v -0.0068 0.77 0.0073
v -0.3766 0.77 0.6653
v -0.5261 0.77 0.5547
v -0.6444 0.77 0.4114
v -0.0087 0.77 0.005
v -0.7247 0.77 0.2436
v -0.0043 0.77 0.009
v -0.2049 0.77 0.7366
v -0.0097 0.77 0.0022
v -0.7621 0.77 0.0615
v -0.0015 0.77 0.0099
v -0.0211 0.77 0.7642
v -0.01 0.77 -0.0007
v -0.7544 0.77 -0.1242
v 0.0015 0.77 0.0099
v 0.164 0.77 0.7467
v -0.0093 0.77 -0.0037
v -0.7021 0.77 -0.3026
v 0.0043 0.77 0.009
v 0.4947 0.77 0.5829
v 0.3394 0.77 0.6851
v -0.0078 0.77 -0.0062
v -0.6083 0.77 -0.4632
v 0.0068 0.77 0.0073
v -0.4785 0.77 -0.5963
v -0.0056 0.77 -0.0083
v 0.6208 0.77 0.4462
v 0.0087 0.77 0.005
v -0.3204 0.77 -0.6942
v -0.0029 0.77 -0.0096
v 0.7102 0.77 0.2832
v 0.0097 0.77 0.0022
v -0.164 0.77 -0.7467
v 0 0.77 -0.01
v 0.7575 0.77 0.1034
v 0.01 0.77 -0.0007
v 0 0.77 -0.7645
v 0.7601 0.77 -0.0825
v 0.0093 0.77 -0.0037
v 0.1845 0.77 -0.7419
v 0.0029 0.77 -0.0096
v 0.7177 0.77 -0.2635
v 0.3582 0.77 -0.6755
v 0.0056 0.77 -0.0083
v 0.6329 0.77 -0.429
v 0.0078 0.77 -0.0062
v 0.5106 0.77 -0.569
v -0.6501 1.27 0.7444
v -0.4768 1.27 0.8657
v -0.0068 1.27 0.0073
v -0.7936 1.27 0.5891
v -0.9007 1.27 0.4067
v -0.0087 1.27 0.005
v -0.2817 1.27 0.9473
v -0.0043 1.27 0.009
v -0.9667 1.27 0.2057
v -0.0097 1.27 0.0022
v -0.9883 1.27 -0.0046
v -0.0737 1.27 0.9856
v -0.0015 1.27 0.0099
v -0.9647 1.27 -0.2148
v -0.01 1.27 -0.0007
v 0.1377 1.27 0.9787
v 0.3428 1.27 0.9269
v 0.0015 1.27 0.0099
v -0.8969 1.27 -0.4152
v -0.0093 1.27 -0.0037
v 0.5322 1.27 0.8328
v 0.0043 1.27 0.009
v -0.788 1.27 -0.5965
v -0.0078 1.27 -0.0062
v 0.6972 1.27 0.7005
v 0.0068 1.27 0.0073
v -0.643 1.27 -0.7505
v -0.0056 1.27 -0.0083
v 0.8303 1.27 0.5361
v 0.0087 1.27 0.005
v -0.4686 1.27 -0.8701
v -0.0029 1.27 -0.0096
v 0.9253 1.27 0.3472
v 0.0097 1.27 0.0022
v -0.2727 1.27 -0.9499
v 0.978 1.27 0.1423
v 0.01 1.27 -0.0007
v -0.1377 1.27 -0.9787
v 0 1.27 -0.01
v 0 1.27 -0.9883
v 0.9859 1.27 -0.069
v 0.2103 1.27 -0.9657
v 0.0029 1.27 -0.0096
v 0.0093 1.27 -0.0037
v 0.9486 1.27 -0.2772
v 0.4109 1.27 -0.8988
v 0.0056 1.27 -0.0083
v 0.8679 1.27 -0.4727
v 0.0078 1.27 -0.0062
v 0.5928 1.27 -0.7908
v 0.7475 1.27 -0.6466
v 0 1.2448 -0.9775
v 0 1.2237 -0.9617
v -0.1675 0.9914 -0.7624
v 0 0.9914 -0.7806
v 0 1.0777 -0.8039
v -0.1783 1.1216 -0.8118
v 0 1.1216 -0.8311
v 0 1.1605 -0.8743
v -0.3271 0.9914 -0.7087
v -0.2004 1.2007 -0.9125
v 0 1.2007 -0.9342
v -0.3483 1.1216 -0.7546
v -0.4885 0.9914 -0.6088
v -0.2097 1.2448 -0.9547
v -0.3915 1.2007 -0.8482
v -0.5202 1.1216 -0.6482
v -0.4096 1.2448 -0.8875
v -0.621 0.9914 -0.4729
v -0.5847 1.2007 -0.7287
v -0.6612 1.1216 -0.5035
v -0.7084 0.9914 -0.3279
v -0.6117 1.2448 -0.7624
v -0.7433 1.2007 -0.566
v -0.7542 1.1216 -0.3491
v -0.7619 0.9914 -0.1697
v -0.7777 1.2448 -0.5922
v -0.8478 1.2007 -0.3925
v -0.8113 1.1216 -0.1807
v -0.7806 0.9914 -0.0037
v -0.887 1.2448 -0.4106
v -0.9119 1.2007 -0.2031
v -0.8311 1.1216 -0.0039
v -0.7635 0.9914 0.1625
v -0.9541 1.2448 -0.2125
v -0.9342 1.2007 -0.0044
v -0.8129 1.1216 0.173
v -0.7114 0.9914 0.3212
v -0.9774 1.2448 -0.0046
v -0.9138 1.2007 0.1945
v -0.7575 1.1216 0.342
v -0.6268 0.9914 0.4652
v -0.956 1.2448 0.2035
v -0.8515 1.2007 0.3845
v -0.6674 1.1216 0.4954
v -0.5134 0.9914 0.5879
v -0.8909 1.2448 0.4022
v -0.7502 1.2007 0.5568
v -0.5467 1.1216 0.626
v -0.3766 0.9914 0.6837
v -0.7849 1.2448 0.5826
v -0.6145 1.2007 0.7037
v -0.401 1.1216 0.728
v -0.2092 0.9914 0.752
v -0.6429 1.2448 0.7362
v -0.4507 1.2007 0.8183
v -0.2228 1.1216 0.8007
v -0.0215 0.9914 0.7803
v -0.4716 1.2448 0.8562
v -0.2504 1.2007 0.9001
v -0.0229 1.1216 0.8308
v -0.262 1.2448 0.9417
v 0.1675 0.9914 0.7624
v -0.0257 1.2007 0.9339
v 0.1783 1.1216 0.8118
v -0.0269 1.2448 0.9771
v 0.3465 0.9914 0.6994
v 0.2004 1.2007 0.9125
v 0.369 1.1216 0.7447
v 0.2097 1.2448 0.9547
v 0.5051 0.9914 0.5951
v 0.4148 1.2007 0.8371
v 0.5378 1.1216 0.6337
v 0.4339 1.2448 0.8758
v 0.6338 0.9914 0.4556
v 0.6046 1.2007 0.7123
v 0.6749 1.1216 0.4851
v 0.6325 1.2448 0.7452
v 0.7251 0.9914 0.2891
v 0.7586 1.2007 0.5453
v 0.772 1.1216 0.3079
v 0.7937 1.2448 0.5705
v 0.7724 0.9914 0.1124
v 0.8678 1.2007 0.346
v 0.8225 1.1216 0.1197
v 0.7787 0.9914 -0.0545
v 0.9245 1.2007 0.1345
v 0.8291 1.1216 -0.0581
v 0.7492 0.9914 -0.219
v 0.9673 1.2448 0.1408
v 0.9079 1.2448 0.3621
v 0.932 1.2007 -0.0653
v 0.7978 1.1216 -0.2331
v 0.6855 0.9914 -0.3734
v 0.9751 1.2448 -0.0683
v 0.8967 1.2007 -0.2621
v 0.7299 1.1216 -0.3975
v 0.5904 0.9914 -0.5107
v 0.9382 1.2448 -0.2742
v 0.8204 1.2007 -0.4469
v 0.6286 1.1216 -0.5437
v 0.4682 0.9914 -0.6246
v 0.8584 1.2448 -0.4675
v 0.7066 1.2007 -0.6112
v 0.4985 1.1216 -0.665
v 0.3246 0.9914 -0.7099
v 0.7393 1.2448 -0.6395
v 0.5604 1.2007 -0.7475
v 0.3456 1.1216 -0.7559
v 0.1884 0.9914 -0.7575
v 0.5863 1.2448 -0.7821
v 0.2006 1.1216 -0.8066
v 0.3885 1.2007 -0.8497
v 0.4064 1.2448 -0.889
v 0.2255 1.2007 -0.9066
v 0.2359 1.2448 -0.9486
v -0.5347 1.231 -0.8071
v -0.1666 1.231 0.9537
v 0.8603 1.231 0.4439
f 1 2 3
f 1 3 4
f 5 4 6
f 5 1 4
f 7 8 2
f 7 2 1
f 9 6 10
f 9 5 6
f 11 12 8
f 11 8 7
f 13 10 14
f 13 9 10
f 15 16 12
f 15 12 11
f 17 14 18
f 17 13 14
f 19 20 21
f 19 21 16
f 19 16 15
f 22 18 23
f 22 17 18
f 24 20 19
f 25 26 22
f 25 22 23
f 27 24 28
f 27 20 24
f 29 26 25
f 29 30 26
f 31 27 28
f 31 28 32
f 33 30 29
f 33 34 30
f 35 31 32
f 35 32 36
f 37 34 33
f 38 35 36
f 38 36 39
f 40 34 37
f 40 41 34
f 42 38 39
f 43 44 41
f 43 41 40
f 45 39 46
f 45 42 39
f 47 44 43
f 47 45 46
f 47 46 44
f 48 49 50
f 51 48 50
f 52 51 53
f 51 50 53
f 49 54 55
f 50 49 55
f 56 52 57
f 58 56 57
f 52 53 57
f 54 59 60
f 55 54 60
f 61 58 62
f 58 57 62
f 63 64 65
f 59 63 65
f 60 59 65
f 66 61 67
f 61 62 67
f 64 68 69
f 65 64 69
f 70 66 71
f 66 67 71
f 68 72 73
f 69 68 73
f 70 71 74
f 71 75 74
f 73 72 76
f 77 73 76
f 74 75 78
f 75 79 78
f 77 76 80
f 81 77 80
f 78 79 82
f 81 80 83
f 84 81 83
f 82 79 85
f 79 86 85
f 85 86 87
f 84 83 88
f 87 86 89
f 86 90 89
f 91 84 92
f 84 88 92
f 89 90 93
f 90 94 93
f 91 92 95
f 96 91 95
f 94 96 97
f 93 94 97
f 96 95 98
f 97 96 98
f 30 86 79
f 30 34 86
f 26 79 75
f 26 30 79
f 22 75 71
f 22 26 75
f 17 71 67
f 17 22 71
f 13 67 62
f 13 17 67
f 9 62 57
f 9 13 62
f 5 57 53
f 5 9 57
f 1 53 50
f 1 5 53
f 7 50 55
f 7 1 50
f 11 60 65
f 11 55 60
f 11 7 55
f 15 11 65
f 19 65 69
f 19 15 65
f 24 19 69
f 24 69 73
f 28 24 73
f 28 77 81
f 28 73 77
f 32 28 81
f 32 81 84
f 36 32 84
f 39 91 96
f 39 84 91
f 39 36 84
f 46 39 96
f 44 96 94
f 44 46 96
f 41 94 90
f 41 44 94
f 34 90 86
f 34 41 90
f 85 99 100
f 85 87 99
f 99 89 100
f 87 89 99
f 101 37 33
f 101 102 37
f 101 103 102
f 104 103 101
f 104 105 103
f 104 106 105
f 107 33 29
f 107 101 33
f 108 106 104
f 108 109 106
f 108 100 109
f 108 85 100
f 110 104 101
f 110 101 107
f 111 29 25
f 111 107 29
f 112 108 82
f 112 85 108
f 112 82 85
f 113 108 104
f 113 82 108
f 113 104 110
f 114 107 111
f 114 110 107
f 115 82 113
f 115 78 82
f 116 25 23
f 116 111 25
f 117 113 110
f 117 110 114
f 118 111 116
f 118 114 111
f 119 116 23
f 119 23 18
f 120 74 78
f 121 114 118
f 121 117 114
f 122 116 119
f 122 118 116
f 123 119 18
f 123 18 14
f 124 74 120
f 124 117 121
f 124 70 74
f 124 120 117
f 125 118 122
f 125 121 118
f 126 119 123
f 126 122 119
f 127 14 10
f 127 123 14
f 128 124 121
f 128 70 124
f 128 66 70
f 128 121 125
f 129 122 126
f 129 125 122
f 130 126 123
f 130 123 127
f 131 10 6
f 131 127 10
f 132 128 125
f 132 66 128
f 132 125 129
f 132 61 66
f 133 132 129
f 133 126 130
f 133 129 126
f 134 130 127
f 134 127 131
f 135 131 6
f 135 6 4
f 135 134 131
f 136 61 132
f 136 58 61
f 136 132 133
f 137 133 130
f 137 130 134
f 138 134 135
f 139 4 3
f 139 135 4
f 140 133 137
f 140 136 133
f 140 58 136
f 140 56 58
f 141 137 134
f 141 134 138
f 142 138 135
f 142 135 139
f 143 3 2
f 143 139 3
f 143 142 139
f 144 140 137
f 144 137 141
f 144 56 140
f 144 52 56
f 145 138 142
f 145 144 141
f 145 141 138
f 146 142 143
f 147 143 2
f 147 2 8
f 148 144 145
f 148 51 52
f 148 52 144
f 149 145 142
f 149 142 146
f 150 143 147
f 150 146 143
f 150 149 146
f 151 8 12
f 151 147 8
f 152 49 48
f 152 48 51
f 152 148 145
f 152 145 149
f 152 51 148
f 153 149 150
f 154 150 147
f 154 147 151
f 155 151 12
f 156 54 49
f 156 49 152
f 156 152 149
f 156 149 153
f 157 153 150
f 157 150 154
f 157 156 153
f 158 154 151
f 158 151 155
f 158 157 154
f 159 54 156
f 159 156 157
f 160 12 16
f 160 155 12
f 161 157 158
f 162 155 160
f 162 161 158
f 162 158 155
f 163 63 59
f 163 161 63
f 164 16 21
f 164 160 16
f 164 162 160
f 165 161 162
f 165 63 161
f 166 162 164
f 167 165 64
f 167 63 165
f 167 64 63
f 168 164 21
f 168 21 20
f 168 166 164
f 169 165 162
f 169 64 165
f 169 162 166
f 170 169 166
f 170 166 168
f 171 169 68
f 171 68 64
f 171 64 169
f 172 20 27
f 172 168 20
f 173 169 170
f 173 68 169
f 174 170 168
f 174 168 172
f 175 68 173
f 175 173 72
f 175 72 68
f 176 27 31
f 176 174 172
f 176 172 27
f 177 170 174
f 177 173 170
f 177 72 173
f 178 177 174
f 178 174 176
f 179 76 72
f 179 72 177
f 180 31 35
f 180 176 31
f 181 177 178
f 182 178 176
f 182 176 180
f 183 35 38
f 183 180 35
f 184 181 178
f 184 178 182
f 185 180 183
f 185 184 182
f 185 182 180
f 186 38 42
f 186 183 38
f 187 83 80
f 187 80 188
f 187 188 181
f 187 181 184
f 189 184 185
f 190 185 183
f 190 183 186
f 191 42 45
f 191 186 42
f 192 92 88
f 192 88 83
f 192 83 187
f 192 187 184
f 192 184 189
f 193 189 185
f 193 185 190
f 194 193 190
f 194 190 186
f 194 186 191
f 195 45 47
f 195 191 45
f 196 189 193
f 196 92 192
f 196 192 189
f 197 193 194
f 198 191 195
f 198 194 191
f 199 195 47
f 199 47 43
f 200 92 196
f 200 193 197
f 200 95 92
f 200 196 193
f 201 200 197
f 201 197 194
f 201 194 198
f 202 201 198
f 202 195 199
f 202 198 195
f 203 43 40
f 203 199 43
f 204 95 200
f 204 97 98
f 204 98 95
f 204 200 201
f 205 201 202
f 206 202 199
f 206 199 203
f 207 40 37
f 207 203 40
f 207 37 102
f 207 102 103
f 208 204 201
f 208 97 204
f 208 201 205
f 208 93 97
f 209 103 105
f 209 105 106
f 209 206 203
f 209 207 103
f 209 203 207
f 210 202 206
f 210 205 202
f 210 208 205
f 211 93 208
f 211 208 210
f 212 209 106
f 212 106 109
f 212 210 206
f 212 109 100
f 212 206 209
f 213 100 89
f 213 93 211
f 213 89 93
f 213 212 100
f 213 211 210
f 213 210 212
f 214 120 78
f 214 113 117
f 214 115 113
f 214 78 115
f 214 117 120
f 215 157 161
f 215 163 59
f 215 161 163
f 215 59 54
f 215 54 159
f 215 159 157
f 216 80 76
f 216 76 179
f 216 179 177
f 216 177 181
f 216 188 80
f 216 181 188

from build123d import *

# Parameters (mm, degrees)
SKETCH032_W   = 5.828926
SKETCH032_H   = 4.647706
SKETCH032_W_2 = 7.405091
SKETCH032_H_2 = 4.530322


with BuildPart() as part:
    # Sketch031 → Revolution006 (revolve)
    with BuildSketch(Plane(origin=(0, 0, -0.01), x_dir=(0, -1, 0), z_dir=(1, 0, 0))):
        with BuildLine():
            add(Edge.make_bspline(
                [(-0.769069, 0.754505), (-0.951665, 0.760534), (-1.141624, 0.77961), (-1.207908, 0.98313), (-1.364894, 0.994421), (-1.864947, 0.98477), (-2.775705, 0.990587), (-2.785126, 0.387148), (-2.848858, 0.260184), (-2.896467, 0.235343), (-2.966179, 0.25)],
                knots=[0, 0, 0, 0, 0.125, 0.25, 0.375, 0.5, 0.625, 0.75, 0.875, 1, 1, 1, 1], degree=3))
            Line((-2.966179, 0.25), (-2.966179, 0))
            Line((-2.966179, 0), (0, 0))
            Line((0, 0), (0, 0.75))
            add(Edge.make_bspline(
                [(-0.769069, 0.754505), (-0.446942, 0.755366), (0, 0.75)],
                knots=[0, 0, 0, 1, 1, 1], degree=2))
        make_face()
    revolution006 = revolve(axis=Axis((0, 0, 0), (0, 1, 0)))

    # Mirrored009: Revolution006 across Sketch031 V_Axis
    add(revolution006.mirror(Plane(origin=(0, 0, -0.01), x_dir=(1, 0, 0), z_dir=(0, -1, 0))))

    # Sketch032 → Groove003 (revolve, cut)
    with BuildSketch(Plane.YZ):
        with Locations((4.184463, 2.323853)):
            Rectangle(SKETCH032_W, SKETCH032_H)
        with Locations((-2.932545, 2.265161)):
            Rectangle(SKETCH032_W_2, SKETCH032_H_2)
    revolve(axis=Axis((0, 0, 0), (0, 1, 0)), mode=Mode.SUBTRACT)


solid = part.part
